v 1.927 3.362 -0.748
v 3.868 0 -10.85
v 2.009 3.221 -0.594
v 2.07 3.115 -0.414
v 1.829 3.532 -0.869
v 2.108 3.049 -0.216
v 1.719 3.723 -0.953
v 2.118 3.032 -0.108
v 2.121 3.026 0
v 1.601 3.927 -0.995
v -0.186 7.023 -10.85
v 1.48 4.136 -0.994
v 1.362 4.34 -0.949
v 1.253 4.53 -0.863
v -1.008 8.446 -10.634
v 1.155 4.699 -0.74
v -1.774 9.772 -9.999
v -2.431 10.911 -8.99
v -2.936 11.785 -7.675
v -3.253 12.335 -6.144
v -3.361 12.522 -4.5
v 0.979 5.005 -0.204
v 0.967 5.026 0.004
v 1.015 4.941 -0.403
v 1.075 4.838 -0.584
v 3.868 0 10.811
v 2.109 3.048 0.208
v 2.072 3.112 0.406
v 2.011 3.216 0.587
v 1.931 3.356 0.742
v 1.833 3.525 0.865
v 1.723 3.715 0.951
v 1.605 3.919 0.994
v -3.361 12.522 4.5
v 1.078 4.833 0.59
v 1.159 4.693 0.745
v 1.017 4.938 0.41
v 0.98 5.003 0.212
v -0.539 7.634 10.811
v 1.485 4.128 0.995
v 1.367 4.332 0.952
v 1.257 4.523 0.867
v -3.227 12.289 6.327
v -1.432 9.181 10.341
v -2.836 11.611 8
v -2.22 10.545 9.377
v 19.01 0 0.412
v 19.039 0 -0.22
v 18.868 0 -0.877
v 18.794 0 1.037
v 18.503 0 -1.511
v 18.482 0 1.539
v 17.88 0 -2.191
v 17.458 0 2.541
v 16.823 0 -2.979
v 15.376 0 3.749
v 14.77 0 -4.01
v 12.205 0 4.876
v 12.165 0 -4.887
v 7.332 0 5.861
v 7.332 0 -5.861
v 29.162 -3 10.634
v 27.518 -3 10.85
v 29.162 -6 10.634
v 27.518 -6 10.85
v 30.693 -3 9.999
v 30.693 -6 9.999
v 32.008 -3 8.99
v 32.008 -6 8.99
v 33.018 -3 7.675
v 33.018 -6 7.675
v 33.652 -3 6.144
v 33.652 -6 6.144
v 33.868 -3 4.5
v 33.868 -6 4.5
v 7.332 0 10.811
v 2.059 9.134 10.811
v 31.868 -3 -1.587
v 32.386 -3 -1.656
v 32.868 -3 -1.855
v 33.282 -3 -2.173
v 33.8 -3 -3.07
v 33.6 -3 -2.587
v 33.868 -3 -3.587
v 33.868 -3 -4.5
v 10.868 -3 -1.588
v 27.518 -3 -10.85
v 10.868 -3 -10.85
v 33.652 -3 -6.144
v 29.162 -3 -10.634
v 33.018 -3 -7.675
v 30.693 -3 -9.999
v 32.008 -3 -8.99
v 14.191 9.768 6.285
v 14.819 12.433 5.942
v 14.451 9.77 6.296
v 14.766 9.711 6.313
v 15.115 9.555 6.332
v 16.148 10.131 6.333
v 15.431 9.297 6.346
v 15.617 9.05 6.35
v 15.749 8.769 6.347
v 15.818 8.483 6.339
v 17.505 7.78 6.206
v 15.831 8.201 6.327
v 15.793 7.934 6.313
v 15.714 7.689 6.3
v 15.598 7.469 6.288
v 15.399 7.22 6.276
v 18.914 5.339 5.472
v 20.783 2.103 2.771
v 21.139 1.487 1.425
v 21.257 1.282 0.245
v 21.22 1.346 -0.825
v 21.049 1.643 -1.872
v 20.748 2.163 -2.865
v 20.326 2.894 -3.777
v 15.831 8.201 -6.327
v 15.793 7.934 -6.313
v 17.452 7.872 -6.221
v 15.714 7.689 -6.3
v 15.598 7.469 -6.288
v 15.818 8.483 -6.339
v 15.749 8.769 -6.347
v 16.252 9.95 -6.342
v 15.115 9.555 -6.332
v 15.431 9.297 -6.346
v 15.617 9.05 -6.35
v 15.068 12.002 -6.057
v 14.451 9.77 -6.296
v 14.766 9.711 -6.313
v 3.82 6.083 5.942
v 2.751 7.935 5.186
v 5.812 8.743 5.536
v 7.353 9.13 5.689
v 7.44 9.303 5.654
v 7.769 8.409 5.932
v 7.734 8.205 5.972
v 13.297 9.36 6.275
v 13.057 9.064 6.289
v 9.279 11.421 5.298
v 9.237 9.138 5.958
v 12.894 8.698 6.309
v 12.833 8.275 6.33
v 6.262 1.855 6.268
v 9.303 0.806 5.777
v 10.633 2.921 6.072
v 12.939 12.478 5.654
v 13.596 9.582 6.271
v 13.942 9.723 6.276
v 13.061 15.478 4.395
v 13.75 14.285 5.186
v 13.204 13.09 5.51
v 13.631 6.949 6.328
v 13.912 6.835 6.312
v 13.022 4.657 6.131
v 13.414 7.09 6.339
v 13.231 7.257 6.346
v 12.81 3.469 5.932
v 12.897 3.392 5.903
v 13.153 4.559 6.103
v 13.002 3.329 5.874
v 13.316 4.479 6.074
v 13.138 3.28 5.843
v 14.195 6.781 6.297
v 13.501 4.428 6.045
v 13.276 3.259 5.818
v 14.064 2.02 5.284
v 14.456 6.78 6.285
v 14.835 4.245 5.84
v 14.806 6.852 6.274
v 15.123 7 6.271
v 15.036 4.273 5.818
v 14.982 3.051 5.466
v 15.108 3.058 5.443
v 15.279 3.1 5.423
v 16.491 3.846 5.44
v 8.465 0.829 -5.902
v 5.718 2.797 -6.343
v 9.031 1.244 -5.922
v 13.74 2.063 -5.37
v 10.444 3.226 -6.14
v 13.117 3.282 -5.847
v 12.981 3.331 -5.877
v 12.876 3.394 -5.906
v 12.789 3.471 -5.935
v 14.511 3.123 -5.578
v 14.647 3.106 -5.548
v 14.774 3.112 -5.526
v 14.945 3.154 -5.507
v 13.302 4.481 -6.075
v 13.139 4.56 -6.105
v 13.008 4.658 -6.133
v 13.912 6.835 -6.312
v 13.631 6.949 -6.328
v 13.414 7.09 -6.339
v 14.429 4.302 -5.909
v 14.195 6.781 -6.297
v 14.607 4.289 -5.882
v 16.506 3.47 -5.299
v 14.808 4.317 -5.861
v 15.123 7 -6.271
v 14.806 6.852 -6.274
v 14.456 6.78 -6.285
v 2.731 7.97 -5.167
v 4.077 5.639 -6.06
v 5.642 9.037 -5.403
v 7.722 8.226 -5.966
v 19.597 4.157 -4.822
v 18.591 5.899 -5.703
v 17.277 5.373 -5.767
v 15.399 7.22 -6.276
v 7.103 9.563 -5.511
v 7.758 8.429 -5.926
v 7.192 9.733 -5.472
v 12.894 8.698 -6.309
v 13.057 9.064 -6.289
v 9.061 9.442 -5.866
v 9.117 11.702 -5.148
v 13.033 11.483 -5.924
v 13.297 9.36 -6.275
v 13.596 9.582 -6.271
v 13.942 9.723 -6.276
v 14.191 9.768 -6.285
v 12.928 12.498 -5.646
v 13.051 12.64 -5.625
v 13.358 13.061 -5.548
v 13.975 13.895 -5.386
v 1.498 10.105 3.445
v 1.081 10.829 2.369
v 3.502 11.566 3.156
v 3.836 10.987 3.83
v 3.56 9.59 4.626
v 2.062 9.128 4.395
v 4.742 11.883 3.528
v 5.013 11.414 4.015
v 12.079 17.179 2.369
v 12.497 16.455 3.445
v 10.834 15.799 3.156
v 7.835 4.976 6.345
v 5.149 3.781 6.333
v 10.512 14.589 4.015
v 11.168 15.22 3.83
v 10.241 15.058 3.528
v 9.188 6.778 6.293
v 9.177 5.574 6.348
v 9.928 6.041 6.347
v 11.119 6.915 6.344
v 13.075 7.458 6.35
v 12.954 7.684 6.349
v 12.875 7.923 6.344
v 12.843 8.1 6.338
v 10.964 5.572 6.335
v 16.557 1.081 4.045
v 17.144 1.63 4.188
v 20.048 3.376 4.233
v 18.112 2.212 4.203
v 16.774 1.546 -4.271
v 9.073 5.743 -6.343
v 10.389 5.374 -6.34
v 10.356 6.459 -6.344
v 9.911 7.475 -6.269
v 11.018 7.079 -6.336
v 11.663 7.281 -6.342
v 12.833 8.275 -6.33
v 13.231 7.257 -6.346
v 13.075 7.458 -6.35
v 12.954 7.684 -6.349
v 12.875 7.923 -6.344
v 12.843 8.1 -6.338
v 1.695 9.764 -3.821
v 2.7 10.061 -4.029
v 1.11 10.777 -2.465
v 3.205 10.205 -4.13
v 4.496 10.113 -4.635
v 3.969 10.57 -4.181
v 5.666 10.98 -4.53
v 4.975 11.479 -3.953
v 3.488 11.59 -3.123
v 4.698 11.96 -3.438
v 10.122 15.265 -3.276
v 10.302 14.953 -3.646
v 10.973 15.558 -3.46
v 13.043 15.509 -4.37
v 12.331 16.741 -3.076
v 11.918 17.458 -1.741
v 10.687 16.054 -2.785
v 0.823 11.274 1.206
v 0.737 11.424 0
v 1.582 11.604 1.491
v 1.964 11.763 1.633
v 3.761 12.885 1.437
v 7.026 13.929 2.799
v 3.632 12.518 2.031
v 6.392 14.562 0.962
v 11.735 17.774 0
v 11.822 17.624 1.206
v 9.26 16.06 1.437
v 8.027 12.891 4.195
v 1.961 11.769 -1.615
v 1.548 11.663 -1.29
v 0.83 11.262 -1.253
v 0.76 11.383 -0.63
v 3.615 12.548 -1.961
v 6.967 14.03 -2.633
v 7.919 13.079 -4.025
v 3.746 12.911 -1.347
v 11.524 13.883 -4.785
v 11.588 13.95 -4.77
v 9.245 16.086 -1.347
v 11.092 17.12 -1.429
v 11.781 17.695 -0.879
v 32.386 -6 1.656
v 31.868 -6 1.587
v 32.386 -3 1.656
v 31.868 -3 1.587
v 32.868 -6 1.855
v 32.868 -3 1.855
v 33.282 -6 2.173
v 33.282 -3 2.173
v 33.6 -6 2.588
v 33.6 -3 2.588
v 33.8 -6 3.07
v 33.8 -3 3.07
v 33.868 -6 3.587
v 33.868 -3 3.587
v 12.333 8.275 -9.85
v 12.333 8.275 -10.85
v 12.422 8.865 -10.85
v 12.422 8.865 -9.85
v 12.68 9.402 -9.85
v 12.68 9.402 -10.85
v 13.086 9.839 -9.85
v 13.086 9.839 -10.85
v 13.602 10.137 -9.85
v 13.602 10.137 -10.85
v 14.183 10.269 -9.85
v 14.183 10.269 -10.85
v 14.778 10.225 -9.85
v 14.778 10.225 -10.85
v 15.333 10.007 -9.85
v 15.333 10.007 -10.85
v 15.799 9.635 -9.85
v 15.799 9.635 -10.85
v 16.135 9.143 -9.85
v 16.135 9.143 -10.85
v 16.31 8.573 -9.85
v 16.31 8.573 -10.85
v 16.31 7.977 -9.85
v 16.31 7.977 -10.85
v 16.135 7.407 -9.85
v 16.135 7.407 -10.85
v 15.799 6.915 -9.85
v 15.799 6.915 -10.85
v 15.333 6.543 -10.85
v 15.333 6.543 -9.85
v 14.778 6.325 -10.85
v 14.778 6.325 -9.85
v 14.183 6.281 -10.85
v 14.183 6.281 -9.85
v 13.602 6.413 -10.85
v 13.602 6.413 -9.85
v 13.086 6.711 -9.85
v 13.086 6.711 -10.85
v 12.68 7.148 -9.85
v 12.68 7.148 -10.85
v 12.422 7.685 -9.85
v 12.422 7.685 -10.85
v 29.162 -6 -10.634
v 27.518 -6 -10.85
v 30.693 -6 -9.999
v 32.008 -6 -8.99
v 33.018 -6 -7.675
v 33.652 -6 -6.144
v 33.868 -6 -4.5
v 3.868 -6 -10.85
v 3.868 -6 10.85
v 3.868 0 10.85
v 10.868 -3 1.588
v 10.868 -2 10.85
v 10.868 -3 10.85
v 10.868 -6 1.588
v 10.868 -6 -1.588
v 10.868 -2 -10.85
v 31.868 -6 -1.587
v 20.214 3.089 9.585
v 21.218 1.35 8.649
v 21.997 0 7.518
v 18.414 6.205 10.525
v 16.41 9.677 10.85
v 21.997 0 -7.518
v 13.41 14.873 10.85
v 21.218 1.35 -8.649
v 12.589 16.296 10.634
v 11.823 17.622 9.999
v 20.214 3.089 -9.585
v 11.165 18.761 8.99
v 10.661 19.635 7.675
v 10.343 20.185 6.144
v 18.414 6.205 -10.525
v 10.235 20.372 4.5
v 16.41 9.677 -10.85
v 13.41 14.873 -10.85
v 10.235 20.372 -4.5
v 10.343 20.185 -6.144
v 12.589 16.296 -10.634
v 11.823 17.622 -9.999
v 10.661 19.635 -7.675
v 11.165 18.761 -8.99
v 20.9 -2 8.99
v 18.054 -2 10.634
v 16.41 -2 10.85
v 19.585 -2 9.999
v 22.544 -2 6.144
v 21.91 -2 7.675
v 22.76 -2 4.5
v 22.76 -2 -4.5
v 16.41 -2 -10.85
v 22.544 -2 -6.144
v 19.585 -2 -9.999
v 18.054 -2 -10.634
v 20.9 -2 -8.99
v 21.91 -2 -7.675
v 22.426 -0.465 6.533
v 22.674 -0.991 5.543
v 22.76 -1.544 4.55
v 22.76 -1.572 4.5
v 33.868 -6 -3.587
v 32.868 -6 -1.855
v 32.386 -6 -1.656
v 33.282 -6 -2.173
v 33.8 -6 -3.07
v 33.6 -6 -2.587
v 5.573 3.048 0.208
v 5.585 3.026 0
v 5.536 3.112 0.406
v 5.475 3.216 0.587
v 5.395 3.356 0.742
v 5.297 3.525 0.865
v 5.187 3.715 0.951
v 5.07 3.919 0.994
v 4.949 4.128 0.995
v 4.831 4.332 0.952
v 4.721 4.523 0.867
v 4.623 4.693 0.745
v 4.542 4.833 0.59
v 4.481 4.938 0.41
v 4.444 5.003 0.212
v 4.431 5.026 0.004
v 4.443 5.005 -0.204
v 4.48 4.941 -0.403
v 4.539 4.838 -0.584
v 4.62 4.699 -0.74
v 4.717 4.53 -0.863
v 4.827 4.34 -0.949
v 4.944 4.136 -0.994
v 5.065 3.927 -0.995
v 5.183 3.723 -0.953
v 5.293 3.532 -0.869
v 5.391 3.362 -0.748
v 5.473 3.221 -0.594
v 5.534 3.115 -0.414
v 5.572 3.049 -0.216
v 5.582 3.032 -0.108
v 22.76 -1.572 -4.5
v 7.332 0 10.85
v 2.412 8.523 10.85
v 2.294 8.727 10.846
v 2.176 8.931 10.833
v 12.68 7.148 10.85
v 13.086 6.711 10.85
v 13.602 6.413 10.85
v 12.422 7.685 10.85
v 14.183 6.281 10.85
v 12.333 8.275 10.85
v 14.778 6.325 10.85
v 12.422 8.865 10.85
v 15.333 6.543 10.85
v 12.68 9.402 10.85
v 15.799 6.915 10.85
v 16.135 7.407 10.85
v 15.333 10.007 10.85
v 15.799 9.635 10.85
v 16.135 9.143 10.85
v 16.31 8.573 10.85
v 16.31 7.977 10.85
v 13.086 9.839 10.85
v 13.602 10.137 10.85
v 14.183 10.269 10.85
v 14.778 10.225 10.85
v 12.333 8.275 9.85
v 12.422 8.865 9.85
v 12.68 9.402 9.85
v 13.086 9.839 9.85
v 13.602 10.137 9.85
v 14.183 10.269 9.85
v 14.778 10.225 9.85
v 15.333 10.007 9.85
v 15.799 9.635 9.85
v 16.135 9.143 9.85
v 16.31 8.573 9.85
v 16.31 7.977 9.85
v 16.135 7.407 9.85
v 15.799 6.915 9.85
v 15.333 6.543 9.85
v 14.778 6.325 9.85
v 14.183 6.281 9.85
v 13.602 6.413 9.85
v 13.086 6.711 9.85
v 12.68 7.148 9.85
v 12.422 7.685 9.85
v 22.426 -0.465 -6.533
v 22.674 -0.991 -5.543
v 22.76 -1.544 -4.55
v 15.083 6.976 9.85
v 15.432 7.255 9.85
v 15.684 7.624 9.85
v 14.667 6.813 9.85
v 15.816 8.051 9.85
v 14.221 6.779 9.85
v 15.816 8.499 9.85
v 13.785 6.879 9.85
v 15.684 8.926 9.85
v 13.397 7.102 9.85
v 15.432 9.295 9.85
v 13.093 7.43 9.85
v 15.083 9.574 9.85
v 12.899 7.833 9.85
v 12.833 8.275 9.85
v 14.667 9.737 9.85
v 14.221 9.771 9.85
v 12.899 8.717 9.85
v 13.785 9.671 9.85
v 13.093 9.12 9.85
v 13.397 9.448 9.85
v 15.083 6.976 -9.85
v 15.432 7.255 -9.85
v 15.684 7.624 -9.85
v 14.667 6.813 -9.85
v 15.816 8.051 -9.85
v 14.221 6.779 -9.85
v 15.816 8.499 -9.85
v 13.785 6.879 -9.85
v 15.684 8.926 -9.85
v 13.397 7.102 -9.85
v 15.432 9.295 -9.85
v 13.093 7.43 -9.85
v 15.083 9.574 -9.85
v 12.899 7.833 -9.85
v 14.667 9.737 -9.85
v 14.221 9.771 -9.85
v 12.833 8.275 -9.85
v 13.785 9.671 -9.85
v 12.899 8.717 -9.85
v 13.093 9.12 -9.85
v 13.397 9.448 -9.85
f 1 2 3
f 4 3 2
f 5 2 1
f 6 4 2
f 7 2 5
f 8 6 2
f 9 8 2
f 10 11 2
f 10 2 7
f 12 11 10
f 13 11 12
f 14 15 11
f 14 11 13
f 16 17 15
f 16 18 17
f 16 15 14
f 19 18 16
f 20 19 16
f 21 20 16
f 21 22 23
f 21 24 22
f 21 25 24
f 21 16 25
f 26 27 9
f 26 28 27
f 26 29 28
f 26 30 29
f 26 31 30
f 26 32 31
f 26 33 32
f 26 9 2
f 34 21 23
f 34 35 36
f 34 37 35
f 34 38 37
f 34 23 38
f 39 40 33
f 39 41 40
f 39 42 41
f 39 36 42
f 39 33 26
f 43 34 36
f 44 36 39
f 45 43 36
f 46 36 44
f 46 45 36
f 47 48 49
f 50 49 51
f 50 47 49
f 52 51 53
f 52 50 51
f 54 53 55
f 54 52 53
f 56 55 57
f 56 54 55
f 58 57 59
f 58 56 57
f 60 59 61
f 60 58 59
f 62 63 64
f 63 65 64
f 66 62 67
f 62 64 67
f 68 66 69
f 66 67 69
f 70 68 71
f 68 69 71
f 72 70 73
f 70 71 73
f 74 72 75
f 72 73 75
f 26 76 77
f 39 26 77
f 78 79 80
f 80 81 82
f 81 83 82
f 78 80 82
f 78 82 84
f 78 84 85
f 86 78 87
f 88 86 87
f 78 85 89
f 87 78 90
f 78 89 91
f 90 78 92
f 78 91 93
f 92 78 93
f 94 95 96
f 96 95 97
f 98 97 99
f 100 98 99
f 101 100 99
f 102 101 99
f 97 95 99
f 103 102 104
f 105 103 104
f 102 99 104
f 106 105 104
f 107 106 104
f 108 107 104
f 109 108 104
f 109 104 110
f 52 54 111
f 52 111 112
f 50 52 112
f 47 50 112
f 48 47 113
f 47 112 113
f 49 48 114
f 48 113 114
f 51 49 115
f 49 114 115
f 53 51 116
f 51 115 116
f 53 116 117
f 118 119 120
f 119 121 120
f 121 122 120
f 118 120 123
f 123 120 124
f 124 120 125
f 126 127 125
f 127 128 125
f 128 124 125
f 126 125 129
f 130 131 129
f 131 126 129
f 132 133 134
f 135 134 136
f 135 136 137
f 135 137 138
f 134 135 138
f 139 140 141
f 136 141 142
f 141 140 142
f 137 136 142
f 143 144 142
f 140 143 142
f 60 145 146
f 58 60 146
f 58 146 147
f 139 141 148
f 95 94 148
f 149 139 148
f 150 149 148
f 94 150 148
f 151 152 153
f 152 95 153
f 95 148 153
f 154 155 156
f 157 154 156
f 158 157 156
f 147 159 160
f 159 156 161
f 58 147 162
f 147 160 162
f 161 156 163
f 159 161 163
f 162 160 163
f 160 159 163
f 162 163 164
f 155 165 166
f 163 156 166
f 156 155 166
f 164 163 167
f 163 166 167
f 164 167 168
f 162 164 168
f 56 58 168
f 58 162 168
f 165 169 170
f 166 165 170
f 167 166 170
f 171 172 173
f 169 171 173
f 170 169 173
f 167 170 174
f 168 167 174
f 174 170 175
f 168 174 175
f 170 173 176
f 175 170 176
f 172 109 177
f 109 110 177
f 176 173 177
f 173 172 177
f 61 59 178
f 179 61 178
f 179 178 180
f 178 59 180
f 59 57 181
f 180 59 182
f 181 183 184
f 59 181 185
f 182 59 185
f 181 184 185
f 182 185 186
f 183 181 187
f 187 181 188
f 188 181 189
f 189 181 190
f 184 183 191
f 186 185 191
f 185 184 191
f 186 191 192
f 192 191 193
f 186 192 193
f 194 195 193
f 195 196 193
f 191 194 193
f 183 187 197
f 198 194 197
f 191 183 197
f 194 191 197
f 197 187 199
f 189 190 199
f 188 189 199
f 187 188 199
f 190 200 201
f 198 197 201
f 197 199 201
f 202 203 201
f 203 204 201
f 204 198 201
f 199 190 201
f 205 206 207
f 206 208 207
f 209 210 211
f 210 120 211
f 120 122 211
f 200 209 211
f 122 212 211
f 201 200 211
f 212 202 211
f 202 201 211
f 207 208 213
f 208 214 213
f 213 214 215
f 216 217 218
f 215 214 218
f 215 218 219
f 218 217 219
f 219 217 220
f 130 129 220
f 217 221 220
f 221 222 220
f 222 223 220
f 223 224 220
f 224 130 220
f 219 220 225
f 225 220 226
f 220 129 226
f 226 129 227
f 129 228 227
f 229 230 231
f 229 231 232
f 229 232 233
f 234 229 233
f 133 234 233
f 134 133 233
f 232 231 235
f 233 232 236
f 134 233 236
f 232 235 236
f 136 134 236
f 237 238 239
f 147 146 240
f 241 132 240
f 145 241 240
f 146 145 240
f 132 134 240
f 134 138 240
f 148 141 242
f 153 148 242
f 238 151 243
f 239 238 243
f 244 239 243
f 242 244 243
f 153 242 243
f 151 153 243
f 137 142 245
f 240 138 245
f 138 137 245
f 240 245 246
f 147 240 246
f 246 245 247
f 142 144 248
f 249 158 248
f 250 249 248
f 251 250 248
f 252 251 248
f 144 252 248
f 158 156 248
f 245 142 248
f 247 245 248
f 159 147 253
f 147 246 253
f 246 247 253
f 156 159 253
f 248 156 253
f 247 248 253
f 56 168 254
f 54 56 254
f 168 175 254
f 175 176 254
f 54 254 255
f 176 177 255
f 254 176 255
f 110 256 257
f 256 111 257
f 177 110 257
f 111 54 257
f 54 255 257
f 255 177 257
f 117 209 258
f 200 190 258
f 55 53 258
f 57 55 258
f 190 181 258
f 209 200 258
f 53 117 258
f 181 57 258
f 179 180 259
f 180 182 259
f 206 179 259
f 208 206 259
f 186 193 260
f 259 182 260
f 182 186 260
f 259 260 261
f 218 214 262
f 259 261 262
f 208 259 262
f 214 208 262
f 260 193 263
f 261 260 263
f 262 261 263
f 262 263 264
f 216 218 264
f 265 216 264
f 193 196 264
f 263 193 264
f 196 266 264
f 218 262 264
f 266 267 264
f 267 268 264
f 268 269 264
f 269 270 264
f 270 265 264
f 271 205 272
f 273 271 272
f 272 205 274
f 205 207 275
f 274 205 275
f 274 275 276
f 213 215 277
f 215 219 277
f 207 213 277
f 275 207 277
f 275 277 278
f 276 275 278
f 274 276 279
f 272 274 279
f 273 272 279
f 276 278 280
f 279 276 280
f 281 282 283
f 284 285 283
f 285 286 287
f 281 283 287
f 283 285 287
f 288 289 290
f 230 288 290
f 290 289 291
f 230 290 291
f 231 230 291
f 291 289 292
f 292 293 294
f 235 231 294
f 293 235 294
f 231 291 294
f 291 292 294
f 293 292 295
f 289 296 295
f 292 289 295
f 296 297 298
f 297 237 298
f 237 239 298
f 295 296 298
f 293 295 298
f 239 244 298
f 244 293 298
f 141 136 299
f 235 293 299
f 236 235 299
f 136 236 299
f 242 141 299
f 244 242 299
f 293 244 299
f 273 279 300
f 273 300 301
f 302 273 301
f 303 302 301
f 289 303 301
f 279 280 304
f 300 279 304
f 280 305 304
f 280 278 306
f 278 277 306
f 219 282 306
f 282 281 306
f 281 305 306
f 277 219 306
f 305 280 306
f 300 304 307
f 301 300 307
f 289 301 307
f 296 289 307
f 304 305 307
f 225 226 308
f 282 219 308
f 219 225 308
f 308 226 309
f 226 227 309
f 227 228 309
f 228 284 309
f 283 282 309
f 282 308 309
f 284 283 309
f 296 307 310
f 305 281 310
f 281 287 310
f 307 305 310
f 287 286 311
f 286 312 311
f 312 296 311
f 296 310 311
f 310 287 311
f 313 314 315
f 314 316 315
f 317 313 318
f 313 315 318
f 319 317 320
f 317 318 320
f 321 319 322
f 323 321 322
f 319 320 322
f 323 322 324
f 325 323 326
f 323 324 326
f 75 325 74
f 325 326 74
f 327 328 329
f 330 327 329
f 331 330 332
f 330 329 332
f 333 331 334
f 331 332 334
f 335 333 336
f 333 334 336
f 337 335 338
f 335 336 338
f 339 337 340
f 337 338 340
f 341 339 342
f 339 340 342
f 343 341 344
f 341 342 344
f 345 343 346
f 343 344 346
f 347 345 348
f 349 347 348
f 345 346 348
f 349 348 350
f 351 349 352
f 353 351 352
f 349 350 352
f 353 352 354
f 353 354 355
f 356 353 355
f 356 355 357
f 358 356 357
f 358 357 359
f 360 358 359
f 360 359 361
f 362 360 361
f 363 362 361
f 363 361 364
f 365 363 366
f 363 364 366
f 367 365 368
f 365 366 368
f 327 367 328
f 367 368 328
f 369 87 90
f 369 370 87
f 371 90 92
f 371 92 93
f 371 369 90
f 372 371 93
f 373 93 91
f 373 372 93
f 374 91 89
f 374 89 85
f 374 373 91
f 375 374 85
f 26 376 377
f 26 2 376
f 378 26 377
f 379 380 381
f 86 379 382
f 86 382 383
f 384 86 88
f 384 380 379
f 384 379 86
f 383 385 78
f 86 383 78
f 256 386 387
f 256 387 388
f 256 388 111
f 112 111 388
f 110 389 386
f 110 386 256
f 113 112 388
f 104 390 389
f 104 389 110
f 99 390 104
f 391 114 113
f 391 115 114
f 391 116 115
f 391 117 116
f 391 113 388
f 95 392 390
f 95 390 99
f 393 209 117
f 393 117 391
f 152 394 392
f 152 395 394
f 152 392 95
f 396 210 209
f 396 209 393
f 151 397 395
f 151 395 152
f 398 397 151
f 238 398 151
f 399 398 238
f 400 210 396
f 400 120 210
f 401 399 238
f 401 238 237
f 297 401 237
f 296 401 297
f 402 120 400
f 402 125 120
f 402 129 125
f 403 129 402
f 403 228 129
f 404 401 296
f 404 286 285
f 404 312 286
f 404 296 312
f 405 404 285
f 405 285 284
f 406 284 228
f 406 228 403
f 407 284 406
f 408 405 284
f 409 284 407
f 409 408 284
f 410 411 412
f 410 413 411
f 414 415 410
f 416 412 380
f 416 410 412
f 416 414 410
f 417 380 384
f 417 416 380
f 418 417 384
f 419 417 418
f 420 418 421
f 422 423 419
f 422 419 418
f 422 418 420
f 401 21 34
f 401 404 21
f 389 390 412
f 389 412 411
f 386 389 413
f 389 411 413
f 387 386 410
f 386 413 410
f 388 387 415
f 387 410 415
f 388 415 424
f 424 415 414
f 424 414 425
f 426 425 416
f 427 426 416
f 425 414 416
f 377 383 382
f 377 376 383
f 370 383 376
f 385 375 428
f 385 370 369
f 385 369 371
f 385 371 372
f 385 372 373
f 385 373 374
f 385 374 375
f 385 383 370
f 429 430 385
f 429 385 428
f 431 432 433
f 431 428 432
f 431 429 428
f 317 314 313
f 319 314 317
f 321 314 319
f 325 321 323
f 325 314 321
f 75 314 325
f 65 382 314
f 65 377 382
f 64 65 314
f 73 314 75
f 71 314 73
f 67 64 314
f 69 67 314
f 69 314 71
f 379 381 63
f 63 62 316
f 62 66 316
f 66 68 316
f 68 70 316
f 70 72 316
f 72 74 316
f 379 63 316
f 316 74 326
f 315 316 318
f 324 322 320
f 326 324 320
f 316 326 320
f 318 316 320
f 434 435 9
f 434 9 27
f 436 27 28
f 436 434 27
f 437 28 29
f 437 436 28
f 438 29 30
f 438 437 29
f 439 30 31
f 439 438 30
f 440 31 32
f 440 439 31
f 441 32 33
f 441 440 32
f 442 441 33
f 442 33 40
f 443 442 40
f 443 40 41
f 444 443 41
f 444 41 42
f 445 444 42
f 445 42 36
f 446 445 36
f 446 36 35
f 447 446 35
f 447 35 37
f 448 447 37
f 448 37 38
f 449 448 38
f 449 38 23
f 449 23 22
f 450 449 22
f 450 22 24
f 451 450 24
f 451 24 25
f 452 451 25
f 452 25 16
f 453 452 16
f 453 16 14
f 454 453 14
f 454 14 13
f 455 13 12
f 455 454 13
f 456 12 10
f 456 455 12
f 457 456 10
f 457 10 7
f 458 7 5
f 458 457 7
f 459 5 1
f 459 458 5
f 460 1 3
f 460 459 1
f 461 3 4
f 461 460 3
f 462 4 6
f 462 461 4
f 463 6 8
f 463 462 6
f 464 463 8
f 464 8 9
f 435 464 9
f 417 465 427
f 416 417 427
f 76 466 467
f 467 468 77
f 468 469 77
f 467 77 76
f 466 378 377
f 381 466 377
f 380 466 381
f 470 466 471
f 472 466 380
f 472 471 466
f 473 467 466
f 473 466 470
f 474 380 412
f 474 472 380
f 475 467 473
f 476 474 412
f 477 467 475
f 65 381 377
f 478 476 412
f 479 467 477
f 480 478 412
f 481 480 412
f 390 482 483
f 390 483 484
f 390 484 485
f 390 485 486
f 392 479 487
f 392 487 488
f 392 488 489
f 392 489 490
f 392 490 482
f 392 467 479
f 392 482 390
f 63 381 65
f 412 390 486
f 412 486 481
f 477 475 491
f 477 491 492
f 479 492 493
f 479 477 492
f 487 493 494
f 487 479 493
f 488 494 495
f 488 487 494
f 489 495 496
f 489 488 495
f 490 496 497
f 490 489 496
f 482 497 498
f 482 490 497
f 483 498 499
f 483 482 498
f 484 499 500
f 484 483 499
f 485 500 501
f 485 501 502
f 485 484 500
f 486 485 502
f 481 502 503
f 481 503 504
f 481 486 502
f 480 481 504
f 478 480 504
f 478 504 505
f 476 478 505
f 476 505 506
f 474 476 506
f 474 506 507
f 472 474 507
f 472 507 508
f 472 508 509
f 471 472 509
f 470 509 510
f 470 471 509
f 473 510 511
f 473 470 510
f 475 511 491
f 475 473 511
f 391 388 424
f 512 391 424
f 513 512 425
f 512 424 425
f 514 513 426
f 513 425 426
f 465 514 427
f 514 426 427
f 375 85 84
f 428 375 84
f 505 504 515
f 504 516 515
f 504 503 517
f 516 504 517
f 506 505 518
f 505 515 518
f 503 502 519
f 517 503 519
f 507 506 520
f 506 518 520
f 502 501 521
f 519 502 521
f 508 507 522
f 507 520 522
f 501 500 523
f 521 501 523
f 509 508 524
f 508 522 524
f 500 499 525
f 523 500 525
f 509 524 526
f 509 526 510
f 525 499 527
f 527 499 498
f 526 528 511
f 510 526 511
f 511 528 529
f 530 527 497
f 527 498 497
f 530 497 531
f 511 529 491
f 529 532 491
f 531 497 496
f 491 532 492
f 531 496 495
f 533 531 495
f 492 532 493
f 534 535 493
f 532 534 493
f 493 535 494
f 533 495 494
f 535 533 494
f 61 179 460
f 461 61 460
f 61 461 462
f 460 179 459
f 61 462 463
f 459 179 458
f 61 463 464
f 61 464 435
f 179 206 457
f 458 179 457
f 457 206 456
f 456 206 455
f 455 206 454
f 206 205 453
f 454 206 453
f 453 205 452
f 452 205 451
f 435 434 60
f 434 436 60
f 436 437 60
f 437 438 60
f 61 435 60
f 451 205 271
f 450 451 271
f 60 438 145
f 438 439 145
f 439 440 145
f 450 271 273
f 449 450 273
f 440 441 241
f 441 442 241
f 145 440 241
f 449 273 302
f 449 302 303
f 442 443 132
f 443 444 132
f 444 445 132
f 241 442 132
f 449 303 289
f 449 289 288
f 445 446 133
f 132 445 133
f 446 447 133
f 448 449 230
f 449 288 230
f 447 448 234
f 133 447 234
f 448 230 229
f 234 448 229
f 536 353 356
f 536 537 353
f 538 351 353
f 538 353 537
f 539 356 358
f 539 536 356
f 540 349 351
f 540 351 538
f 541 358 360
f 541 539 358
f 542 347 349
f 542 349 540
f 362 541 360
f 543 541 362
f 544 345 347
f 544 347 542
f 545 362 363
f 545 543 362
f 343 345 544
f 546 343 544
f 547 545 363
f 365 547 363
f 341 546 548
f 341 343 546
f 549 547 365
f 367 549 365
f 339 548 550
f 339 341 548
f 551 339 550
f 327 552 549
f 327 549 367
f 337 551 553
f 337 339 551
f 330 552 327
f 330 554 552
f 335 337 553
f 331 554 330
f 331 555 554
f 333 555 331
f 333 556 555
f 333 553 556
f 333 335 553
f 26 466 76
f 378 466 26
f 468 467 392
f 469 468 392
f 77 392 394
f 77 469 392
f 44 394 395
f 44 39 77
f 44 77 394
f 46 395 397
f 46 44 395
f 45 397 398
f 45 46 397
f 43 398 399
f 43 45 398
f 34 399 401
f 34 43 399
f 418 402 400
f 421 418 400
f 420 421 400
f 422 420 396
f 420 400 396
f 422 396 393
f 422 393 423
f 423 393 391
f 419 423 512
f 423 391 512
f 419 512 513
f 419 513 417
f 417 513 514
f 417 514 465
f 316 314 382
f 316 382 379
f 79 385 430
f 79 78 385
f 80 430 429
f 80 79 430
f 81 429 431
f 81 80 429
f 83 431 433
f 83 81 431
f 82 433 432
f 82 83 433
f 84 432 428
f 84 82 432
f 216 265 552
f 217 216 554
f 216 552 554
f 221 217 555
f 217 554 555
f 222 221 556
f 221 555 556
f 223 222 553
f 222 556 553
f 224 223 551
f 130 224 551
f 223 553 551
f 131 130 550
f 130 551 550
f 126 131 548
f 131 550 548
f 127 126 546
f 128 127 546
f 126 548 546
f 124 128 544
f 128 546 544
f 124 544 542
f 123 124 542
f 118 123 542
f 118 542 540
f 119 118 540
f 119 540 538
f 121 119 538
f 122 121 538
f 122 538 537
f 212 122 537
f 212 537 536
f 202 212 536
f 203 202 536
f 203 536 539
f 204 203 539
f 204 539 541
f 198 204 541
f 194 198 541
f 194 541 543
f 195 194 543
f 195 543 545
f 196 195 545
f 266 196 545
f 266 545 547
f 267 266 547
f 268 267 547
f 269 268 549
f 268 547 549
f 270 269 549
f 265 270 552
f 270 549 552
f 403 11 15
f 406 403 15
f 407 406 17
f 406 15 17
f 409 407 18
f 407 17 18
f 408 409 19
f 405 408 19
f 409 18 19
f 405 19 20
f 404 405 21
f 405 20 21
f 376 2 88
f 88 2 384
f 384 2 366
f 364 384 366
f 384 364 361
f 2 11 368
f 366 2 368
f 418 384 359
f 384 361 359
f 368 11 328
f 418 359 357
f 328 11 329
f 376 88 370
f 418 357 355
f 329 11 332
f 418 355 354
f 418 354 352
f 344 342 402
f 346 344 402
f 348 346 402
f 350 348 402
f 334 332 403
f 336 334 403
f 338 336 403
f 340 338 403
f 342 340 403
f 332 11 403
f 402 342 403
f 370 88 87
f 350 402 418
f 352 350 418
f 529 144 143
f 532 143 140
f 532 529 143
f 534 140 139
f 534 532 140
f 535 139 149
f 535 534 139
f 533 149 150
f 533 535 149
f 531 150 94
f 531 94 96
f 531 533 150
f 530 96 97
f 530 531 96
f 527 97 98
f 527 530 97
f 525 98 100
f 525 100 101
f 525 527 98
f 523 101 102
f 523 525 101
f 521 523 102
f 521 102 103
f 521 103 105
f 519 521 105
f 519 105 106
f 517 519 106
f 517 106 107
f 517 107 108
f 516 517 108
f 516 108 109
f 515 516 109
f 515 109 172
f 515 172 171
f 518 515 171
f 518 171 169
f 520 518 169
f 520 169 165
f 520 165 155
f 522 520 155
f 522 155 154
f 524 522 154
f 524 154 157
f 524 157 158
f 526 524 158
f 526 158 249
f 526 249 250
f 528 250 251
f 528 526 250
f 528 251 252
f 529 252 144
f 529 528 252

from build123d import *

# Parameters (mm, degrees)
SKETCH2_W           = 21.7
SKETCH2_H           = 25.05
SKETCH2_RX          = 9.525
SKETCH2_RY          = 6.35
BOSS_EXTRUDE1_DEPTH = 12.7
SKETCH3_W           = 21.660653916
SKETCH3_H           = 25.05
BOSS_EXTRUDE2_DEPTH = 3
SKETCH5_W           = 18.892037138
SKETCH5_H           = 21.7
BOSS_EXTRUDE3_DEPTH = 2
SKETCH6_W           = 30
SKETCH6_H           = 21.7
BOSS_EXTRUDE4_DEPTH = 4
SKETCH7_W           = 21.7
SKETCH7_H           = 1
SKETCH7_W_2         = 3.175
SKETCH7_H_2         = 3
CUT_EXTRUDE2_DEPTH  = 23
SKETCH7_3_W         = 21.7
SKETCH7_3_H         = 7.272473706
CUT_EXTRUDE3_DEPTH  = 44.803879418
SKETCH11_R          = 1
CUT_EXTRUDE8_DEPTH  = 33.487034031
CUT_EXTRUDE4_REACH  = 47.088
SKETCH9_R           = 1.5
SKETCH10_R          = 2
CUT_EXTRUDE7_DEPTH  = 1
FILLET5_R           = 6.35
FILLET6_R           = 2
FILLET7_R           = 2


with BuildPart() as part:
    # Sketch2 → Boss-Extrude1 (new body)
    with BuildSketch(Plane(origin=(16.497783942, 9.525, 0), x_dir=(0, 0, -1), z_dir=(0.8660254037844379, 0.5000000000000013, 0))):
        Rectangle(SKETCH2_W, SKETCH2_H)
        with Locations(Location((0, 0), (0, 0, 90))):
            Ellipse(SKETCH2_RX, SKETCH2_RY, mode=Mode.SUBTRACT)
    extrude(amount=-BOSS_EXTRUDE1_DEPTH)

    # Sketch3 → Boss-Extrude2 (add)
    with BuildSketch(Plane(origin=(5.499261314, 3.175, 0), x_dir=(0, 0, 1), z_dir=(-0.8660254037844379, -0.5000000000000014, 0))):
        with Locations((-0.019673042, 0)):
            Rectangle(SKETCH3_W, SKETCH3_H)
    extrude(amount=BOSS_EXTRUDE2_DEPTH)

    # Sketch5 → Boss-Extrude3 (add)
    with BuildSketch(Plane(origin=(0, 0, 0), x_dir=(-1, 0, 0), z_dir=(0, 1, 0))):
        with Locations((-13.314265373, 0)):
            Rectangle(SKETCH5_W, SKETCH5_H)
    extrude(amount=-BOSS_EXTRUDE3_DEPTH)

    # Sketch6 → Boss-Extrude4 (add)
    with BuildSketch(Plane.XZ.offset(2)):
        with Locations((18.868246804, 0)):
            Rectangle(SKETCH6_W, SKETCH6_H)
    extrude(amount=BOSS_EXTRUDE4_DEPTH)

    # Sketch7 → Cut-Extrude2 (cut)
    with BuildSketch(Plane(origin=(33.868246804, 0, 0), x_dir=(0, 0, -1), z_dir=(1, 0, 0))):
        with Locations((0, -2.5)):
            Rectangle(SKETCH7_W, SKETCH7_H)
        with Locations((0, -4.5)):
            Rectangle(SKETCH7_W_2, SKETCH7_H_2)
    extrude(amount=-CUT_EXTRUDE2_DEPTH, mode=Mode.SUBTRACT)

    # Sketch7<3> → Cut-Extrude3 (cut, through all)
    with BuildSketch(Plane(origin=(33.868246804, 0, 0), x_dir=(0, 0, -1), z_dir=(1, 0, 0))):
        with Locations((0, -9.636236853)):
            Rectangle(SKETCH7_3_W, SKETCH7_3_H)
    extrude(amount=-CUT_EXTRUDE3_DEPTH, mode=Mode.SUBTRACT)

    # Sketch11 → Cut-Extrude8 (cut, through all)
    with BuildSketch(Plane(origin=(19.672783942, 0.194872981, 0), x_dir=(0, 0, -1), z_dir=(-1, 0, 0))):
        with Locations(Location((0, -3.830865705, 0), (0, 0, 90))):
            Circle(SKETCH11_R)
    extrude(amount=CUT_EXTRUDE8_DEPTH, mode=Mode.SUBTRACT)

    # Sketch9 → Cut-Extrude4 (cut, up to next)
    with BuildSketch(Plane(origin=(0, 0, -10.85), x_dir=(-1, 0, 0), z_dir=(0, 0, -1)), mode=Mode.PRIVATE) as cut_extrude4_sk1:
        with Locations((-14.332720433, 8.275)):
            Circle(SKETCH9_R)
    cut_extrude4_tool1 = extrude(cut_extrude4_sk1.sketch, amount=-CUT_EXTRUDE4_REACH, mode=Mode.PRIVATE) & part.part
    cut_extrude4 = cut_extrude4_tool1.solids().sort_by_distance((14.33272, 8.275, -10.85))[0]
    add(cut_extrude4, mode=Mode.SUBTRACT)

    # Sketch10 → Cut-Extrude7 (cut)
    with BuildSketch(Plane(origin=(0, 0, -10.85), x_dir=(-1, 0, 0), z_dir=(0, 0, -1))):
        with Locations((-14.332720433, 8.275)):
            Circle(SKETCH10_R)
    cut_extrude7 = extrude(amount=-CUT_EXTRUDE7_DEPTH, mode=Mode.SUBTRACT)

    # Mirror1: Cut-Extrude4, Cut-Extrude7 across plane
    add(cut_extrude4.mirror(Plane.XY), mode=Mode.SUBTRACT)
    add(cut_extrude7.mirror(Plane.XY), mode=Mode.SUBTRACT)

    # Fillet5
    fillet5_edges = [part.edges().sort_by_distance(p)[0] for p in [
        (33.868246804, -4.5, 10.85),
        (33.868246804, -4.5, -10.85),
        (22.760283942, -1, -10.85),
        (22.760283942, -1, 10.85),
        (4.736022628, 17.196968182, 10.85),
        (3.436984522, 16.446968182, -10.85),
    ]]
    fillet(fillet5_edges, radius=FILLET5_R)

    # Fillet6
    fillet6_edges = [part.edges().sort_by_distance(p)[0] for p in [
        (33.868246804, -4.5, 1.5875),
        (33.868246804, -4.5, -1.5875),
    ]]
    fillet(fillet6_edges, radius=FILLET6_R)

    # Fillet7
    # the kernel refuses this fillet: 2 mm, written as the material it takes off along each edge
    with BuildSketch(Plane(origin=(22.760283942, 0, 8.429393602), x_dir=(-1, 0, 0), z_dir=(0, 0, -1))) as fillet7_piece_1:
        with BuildLine():
            CenterArc((2, -1.571757441), FILLET7_R, 128.197977663, 51.802022337)
            Line((0, -1.571757441), (-0.04, -1.571757441))
            Line((-0.04, -1.571757441), (-0.04, 0))
            Line((-0.04, 0), (0, 0.04))
            ThreePointArc((0, 0.04), (0.381619343, 0.04), (0.73850346, 0.031435149))
            Line((0.73850346, 0.031435149), (0.763238686, 0))
        make_face()
    extrude(amount=16.858787203, mode=Mode.SUBTRACT)


solid = part.part
